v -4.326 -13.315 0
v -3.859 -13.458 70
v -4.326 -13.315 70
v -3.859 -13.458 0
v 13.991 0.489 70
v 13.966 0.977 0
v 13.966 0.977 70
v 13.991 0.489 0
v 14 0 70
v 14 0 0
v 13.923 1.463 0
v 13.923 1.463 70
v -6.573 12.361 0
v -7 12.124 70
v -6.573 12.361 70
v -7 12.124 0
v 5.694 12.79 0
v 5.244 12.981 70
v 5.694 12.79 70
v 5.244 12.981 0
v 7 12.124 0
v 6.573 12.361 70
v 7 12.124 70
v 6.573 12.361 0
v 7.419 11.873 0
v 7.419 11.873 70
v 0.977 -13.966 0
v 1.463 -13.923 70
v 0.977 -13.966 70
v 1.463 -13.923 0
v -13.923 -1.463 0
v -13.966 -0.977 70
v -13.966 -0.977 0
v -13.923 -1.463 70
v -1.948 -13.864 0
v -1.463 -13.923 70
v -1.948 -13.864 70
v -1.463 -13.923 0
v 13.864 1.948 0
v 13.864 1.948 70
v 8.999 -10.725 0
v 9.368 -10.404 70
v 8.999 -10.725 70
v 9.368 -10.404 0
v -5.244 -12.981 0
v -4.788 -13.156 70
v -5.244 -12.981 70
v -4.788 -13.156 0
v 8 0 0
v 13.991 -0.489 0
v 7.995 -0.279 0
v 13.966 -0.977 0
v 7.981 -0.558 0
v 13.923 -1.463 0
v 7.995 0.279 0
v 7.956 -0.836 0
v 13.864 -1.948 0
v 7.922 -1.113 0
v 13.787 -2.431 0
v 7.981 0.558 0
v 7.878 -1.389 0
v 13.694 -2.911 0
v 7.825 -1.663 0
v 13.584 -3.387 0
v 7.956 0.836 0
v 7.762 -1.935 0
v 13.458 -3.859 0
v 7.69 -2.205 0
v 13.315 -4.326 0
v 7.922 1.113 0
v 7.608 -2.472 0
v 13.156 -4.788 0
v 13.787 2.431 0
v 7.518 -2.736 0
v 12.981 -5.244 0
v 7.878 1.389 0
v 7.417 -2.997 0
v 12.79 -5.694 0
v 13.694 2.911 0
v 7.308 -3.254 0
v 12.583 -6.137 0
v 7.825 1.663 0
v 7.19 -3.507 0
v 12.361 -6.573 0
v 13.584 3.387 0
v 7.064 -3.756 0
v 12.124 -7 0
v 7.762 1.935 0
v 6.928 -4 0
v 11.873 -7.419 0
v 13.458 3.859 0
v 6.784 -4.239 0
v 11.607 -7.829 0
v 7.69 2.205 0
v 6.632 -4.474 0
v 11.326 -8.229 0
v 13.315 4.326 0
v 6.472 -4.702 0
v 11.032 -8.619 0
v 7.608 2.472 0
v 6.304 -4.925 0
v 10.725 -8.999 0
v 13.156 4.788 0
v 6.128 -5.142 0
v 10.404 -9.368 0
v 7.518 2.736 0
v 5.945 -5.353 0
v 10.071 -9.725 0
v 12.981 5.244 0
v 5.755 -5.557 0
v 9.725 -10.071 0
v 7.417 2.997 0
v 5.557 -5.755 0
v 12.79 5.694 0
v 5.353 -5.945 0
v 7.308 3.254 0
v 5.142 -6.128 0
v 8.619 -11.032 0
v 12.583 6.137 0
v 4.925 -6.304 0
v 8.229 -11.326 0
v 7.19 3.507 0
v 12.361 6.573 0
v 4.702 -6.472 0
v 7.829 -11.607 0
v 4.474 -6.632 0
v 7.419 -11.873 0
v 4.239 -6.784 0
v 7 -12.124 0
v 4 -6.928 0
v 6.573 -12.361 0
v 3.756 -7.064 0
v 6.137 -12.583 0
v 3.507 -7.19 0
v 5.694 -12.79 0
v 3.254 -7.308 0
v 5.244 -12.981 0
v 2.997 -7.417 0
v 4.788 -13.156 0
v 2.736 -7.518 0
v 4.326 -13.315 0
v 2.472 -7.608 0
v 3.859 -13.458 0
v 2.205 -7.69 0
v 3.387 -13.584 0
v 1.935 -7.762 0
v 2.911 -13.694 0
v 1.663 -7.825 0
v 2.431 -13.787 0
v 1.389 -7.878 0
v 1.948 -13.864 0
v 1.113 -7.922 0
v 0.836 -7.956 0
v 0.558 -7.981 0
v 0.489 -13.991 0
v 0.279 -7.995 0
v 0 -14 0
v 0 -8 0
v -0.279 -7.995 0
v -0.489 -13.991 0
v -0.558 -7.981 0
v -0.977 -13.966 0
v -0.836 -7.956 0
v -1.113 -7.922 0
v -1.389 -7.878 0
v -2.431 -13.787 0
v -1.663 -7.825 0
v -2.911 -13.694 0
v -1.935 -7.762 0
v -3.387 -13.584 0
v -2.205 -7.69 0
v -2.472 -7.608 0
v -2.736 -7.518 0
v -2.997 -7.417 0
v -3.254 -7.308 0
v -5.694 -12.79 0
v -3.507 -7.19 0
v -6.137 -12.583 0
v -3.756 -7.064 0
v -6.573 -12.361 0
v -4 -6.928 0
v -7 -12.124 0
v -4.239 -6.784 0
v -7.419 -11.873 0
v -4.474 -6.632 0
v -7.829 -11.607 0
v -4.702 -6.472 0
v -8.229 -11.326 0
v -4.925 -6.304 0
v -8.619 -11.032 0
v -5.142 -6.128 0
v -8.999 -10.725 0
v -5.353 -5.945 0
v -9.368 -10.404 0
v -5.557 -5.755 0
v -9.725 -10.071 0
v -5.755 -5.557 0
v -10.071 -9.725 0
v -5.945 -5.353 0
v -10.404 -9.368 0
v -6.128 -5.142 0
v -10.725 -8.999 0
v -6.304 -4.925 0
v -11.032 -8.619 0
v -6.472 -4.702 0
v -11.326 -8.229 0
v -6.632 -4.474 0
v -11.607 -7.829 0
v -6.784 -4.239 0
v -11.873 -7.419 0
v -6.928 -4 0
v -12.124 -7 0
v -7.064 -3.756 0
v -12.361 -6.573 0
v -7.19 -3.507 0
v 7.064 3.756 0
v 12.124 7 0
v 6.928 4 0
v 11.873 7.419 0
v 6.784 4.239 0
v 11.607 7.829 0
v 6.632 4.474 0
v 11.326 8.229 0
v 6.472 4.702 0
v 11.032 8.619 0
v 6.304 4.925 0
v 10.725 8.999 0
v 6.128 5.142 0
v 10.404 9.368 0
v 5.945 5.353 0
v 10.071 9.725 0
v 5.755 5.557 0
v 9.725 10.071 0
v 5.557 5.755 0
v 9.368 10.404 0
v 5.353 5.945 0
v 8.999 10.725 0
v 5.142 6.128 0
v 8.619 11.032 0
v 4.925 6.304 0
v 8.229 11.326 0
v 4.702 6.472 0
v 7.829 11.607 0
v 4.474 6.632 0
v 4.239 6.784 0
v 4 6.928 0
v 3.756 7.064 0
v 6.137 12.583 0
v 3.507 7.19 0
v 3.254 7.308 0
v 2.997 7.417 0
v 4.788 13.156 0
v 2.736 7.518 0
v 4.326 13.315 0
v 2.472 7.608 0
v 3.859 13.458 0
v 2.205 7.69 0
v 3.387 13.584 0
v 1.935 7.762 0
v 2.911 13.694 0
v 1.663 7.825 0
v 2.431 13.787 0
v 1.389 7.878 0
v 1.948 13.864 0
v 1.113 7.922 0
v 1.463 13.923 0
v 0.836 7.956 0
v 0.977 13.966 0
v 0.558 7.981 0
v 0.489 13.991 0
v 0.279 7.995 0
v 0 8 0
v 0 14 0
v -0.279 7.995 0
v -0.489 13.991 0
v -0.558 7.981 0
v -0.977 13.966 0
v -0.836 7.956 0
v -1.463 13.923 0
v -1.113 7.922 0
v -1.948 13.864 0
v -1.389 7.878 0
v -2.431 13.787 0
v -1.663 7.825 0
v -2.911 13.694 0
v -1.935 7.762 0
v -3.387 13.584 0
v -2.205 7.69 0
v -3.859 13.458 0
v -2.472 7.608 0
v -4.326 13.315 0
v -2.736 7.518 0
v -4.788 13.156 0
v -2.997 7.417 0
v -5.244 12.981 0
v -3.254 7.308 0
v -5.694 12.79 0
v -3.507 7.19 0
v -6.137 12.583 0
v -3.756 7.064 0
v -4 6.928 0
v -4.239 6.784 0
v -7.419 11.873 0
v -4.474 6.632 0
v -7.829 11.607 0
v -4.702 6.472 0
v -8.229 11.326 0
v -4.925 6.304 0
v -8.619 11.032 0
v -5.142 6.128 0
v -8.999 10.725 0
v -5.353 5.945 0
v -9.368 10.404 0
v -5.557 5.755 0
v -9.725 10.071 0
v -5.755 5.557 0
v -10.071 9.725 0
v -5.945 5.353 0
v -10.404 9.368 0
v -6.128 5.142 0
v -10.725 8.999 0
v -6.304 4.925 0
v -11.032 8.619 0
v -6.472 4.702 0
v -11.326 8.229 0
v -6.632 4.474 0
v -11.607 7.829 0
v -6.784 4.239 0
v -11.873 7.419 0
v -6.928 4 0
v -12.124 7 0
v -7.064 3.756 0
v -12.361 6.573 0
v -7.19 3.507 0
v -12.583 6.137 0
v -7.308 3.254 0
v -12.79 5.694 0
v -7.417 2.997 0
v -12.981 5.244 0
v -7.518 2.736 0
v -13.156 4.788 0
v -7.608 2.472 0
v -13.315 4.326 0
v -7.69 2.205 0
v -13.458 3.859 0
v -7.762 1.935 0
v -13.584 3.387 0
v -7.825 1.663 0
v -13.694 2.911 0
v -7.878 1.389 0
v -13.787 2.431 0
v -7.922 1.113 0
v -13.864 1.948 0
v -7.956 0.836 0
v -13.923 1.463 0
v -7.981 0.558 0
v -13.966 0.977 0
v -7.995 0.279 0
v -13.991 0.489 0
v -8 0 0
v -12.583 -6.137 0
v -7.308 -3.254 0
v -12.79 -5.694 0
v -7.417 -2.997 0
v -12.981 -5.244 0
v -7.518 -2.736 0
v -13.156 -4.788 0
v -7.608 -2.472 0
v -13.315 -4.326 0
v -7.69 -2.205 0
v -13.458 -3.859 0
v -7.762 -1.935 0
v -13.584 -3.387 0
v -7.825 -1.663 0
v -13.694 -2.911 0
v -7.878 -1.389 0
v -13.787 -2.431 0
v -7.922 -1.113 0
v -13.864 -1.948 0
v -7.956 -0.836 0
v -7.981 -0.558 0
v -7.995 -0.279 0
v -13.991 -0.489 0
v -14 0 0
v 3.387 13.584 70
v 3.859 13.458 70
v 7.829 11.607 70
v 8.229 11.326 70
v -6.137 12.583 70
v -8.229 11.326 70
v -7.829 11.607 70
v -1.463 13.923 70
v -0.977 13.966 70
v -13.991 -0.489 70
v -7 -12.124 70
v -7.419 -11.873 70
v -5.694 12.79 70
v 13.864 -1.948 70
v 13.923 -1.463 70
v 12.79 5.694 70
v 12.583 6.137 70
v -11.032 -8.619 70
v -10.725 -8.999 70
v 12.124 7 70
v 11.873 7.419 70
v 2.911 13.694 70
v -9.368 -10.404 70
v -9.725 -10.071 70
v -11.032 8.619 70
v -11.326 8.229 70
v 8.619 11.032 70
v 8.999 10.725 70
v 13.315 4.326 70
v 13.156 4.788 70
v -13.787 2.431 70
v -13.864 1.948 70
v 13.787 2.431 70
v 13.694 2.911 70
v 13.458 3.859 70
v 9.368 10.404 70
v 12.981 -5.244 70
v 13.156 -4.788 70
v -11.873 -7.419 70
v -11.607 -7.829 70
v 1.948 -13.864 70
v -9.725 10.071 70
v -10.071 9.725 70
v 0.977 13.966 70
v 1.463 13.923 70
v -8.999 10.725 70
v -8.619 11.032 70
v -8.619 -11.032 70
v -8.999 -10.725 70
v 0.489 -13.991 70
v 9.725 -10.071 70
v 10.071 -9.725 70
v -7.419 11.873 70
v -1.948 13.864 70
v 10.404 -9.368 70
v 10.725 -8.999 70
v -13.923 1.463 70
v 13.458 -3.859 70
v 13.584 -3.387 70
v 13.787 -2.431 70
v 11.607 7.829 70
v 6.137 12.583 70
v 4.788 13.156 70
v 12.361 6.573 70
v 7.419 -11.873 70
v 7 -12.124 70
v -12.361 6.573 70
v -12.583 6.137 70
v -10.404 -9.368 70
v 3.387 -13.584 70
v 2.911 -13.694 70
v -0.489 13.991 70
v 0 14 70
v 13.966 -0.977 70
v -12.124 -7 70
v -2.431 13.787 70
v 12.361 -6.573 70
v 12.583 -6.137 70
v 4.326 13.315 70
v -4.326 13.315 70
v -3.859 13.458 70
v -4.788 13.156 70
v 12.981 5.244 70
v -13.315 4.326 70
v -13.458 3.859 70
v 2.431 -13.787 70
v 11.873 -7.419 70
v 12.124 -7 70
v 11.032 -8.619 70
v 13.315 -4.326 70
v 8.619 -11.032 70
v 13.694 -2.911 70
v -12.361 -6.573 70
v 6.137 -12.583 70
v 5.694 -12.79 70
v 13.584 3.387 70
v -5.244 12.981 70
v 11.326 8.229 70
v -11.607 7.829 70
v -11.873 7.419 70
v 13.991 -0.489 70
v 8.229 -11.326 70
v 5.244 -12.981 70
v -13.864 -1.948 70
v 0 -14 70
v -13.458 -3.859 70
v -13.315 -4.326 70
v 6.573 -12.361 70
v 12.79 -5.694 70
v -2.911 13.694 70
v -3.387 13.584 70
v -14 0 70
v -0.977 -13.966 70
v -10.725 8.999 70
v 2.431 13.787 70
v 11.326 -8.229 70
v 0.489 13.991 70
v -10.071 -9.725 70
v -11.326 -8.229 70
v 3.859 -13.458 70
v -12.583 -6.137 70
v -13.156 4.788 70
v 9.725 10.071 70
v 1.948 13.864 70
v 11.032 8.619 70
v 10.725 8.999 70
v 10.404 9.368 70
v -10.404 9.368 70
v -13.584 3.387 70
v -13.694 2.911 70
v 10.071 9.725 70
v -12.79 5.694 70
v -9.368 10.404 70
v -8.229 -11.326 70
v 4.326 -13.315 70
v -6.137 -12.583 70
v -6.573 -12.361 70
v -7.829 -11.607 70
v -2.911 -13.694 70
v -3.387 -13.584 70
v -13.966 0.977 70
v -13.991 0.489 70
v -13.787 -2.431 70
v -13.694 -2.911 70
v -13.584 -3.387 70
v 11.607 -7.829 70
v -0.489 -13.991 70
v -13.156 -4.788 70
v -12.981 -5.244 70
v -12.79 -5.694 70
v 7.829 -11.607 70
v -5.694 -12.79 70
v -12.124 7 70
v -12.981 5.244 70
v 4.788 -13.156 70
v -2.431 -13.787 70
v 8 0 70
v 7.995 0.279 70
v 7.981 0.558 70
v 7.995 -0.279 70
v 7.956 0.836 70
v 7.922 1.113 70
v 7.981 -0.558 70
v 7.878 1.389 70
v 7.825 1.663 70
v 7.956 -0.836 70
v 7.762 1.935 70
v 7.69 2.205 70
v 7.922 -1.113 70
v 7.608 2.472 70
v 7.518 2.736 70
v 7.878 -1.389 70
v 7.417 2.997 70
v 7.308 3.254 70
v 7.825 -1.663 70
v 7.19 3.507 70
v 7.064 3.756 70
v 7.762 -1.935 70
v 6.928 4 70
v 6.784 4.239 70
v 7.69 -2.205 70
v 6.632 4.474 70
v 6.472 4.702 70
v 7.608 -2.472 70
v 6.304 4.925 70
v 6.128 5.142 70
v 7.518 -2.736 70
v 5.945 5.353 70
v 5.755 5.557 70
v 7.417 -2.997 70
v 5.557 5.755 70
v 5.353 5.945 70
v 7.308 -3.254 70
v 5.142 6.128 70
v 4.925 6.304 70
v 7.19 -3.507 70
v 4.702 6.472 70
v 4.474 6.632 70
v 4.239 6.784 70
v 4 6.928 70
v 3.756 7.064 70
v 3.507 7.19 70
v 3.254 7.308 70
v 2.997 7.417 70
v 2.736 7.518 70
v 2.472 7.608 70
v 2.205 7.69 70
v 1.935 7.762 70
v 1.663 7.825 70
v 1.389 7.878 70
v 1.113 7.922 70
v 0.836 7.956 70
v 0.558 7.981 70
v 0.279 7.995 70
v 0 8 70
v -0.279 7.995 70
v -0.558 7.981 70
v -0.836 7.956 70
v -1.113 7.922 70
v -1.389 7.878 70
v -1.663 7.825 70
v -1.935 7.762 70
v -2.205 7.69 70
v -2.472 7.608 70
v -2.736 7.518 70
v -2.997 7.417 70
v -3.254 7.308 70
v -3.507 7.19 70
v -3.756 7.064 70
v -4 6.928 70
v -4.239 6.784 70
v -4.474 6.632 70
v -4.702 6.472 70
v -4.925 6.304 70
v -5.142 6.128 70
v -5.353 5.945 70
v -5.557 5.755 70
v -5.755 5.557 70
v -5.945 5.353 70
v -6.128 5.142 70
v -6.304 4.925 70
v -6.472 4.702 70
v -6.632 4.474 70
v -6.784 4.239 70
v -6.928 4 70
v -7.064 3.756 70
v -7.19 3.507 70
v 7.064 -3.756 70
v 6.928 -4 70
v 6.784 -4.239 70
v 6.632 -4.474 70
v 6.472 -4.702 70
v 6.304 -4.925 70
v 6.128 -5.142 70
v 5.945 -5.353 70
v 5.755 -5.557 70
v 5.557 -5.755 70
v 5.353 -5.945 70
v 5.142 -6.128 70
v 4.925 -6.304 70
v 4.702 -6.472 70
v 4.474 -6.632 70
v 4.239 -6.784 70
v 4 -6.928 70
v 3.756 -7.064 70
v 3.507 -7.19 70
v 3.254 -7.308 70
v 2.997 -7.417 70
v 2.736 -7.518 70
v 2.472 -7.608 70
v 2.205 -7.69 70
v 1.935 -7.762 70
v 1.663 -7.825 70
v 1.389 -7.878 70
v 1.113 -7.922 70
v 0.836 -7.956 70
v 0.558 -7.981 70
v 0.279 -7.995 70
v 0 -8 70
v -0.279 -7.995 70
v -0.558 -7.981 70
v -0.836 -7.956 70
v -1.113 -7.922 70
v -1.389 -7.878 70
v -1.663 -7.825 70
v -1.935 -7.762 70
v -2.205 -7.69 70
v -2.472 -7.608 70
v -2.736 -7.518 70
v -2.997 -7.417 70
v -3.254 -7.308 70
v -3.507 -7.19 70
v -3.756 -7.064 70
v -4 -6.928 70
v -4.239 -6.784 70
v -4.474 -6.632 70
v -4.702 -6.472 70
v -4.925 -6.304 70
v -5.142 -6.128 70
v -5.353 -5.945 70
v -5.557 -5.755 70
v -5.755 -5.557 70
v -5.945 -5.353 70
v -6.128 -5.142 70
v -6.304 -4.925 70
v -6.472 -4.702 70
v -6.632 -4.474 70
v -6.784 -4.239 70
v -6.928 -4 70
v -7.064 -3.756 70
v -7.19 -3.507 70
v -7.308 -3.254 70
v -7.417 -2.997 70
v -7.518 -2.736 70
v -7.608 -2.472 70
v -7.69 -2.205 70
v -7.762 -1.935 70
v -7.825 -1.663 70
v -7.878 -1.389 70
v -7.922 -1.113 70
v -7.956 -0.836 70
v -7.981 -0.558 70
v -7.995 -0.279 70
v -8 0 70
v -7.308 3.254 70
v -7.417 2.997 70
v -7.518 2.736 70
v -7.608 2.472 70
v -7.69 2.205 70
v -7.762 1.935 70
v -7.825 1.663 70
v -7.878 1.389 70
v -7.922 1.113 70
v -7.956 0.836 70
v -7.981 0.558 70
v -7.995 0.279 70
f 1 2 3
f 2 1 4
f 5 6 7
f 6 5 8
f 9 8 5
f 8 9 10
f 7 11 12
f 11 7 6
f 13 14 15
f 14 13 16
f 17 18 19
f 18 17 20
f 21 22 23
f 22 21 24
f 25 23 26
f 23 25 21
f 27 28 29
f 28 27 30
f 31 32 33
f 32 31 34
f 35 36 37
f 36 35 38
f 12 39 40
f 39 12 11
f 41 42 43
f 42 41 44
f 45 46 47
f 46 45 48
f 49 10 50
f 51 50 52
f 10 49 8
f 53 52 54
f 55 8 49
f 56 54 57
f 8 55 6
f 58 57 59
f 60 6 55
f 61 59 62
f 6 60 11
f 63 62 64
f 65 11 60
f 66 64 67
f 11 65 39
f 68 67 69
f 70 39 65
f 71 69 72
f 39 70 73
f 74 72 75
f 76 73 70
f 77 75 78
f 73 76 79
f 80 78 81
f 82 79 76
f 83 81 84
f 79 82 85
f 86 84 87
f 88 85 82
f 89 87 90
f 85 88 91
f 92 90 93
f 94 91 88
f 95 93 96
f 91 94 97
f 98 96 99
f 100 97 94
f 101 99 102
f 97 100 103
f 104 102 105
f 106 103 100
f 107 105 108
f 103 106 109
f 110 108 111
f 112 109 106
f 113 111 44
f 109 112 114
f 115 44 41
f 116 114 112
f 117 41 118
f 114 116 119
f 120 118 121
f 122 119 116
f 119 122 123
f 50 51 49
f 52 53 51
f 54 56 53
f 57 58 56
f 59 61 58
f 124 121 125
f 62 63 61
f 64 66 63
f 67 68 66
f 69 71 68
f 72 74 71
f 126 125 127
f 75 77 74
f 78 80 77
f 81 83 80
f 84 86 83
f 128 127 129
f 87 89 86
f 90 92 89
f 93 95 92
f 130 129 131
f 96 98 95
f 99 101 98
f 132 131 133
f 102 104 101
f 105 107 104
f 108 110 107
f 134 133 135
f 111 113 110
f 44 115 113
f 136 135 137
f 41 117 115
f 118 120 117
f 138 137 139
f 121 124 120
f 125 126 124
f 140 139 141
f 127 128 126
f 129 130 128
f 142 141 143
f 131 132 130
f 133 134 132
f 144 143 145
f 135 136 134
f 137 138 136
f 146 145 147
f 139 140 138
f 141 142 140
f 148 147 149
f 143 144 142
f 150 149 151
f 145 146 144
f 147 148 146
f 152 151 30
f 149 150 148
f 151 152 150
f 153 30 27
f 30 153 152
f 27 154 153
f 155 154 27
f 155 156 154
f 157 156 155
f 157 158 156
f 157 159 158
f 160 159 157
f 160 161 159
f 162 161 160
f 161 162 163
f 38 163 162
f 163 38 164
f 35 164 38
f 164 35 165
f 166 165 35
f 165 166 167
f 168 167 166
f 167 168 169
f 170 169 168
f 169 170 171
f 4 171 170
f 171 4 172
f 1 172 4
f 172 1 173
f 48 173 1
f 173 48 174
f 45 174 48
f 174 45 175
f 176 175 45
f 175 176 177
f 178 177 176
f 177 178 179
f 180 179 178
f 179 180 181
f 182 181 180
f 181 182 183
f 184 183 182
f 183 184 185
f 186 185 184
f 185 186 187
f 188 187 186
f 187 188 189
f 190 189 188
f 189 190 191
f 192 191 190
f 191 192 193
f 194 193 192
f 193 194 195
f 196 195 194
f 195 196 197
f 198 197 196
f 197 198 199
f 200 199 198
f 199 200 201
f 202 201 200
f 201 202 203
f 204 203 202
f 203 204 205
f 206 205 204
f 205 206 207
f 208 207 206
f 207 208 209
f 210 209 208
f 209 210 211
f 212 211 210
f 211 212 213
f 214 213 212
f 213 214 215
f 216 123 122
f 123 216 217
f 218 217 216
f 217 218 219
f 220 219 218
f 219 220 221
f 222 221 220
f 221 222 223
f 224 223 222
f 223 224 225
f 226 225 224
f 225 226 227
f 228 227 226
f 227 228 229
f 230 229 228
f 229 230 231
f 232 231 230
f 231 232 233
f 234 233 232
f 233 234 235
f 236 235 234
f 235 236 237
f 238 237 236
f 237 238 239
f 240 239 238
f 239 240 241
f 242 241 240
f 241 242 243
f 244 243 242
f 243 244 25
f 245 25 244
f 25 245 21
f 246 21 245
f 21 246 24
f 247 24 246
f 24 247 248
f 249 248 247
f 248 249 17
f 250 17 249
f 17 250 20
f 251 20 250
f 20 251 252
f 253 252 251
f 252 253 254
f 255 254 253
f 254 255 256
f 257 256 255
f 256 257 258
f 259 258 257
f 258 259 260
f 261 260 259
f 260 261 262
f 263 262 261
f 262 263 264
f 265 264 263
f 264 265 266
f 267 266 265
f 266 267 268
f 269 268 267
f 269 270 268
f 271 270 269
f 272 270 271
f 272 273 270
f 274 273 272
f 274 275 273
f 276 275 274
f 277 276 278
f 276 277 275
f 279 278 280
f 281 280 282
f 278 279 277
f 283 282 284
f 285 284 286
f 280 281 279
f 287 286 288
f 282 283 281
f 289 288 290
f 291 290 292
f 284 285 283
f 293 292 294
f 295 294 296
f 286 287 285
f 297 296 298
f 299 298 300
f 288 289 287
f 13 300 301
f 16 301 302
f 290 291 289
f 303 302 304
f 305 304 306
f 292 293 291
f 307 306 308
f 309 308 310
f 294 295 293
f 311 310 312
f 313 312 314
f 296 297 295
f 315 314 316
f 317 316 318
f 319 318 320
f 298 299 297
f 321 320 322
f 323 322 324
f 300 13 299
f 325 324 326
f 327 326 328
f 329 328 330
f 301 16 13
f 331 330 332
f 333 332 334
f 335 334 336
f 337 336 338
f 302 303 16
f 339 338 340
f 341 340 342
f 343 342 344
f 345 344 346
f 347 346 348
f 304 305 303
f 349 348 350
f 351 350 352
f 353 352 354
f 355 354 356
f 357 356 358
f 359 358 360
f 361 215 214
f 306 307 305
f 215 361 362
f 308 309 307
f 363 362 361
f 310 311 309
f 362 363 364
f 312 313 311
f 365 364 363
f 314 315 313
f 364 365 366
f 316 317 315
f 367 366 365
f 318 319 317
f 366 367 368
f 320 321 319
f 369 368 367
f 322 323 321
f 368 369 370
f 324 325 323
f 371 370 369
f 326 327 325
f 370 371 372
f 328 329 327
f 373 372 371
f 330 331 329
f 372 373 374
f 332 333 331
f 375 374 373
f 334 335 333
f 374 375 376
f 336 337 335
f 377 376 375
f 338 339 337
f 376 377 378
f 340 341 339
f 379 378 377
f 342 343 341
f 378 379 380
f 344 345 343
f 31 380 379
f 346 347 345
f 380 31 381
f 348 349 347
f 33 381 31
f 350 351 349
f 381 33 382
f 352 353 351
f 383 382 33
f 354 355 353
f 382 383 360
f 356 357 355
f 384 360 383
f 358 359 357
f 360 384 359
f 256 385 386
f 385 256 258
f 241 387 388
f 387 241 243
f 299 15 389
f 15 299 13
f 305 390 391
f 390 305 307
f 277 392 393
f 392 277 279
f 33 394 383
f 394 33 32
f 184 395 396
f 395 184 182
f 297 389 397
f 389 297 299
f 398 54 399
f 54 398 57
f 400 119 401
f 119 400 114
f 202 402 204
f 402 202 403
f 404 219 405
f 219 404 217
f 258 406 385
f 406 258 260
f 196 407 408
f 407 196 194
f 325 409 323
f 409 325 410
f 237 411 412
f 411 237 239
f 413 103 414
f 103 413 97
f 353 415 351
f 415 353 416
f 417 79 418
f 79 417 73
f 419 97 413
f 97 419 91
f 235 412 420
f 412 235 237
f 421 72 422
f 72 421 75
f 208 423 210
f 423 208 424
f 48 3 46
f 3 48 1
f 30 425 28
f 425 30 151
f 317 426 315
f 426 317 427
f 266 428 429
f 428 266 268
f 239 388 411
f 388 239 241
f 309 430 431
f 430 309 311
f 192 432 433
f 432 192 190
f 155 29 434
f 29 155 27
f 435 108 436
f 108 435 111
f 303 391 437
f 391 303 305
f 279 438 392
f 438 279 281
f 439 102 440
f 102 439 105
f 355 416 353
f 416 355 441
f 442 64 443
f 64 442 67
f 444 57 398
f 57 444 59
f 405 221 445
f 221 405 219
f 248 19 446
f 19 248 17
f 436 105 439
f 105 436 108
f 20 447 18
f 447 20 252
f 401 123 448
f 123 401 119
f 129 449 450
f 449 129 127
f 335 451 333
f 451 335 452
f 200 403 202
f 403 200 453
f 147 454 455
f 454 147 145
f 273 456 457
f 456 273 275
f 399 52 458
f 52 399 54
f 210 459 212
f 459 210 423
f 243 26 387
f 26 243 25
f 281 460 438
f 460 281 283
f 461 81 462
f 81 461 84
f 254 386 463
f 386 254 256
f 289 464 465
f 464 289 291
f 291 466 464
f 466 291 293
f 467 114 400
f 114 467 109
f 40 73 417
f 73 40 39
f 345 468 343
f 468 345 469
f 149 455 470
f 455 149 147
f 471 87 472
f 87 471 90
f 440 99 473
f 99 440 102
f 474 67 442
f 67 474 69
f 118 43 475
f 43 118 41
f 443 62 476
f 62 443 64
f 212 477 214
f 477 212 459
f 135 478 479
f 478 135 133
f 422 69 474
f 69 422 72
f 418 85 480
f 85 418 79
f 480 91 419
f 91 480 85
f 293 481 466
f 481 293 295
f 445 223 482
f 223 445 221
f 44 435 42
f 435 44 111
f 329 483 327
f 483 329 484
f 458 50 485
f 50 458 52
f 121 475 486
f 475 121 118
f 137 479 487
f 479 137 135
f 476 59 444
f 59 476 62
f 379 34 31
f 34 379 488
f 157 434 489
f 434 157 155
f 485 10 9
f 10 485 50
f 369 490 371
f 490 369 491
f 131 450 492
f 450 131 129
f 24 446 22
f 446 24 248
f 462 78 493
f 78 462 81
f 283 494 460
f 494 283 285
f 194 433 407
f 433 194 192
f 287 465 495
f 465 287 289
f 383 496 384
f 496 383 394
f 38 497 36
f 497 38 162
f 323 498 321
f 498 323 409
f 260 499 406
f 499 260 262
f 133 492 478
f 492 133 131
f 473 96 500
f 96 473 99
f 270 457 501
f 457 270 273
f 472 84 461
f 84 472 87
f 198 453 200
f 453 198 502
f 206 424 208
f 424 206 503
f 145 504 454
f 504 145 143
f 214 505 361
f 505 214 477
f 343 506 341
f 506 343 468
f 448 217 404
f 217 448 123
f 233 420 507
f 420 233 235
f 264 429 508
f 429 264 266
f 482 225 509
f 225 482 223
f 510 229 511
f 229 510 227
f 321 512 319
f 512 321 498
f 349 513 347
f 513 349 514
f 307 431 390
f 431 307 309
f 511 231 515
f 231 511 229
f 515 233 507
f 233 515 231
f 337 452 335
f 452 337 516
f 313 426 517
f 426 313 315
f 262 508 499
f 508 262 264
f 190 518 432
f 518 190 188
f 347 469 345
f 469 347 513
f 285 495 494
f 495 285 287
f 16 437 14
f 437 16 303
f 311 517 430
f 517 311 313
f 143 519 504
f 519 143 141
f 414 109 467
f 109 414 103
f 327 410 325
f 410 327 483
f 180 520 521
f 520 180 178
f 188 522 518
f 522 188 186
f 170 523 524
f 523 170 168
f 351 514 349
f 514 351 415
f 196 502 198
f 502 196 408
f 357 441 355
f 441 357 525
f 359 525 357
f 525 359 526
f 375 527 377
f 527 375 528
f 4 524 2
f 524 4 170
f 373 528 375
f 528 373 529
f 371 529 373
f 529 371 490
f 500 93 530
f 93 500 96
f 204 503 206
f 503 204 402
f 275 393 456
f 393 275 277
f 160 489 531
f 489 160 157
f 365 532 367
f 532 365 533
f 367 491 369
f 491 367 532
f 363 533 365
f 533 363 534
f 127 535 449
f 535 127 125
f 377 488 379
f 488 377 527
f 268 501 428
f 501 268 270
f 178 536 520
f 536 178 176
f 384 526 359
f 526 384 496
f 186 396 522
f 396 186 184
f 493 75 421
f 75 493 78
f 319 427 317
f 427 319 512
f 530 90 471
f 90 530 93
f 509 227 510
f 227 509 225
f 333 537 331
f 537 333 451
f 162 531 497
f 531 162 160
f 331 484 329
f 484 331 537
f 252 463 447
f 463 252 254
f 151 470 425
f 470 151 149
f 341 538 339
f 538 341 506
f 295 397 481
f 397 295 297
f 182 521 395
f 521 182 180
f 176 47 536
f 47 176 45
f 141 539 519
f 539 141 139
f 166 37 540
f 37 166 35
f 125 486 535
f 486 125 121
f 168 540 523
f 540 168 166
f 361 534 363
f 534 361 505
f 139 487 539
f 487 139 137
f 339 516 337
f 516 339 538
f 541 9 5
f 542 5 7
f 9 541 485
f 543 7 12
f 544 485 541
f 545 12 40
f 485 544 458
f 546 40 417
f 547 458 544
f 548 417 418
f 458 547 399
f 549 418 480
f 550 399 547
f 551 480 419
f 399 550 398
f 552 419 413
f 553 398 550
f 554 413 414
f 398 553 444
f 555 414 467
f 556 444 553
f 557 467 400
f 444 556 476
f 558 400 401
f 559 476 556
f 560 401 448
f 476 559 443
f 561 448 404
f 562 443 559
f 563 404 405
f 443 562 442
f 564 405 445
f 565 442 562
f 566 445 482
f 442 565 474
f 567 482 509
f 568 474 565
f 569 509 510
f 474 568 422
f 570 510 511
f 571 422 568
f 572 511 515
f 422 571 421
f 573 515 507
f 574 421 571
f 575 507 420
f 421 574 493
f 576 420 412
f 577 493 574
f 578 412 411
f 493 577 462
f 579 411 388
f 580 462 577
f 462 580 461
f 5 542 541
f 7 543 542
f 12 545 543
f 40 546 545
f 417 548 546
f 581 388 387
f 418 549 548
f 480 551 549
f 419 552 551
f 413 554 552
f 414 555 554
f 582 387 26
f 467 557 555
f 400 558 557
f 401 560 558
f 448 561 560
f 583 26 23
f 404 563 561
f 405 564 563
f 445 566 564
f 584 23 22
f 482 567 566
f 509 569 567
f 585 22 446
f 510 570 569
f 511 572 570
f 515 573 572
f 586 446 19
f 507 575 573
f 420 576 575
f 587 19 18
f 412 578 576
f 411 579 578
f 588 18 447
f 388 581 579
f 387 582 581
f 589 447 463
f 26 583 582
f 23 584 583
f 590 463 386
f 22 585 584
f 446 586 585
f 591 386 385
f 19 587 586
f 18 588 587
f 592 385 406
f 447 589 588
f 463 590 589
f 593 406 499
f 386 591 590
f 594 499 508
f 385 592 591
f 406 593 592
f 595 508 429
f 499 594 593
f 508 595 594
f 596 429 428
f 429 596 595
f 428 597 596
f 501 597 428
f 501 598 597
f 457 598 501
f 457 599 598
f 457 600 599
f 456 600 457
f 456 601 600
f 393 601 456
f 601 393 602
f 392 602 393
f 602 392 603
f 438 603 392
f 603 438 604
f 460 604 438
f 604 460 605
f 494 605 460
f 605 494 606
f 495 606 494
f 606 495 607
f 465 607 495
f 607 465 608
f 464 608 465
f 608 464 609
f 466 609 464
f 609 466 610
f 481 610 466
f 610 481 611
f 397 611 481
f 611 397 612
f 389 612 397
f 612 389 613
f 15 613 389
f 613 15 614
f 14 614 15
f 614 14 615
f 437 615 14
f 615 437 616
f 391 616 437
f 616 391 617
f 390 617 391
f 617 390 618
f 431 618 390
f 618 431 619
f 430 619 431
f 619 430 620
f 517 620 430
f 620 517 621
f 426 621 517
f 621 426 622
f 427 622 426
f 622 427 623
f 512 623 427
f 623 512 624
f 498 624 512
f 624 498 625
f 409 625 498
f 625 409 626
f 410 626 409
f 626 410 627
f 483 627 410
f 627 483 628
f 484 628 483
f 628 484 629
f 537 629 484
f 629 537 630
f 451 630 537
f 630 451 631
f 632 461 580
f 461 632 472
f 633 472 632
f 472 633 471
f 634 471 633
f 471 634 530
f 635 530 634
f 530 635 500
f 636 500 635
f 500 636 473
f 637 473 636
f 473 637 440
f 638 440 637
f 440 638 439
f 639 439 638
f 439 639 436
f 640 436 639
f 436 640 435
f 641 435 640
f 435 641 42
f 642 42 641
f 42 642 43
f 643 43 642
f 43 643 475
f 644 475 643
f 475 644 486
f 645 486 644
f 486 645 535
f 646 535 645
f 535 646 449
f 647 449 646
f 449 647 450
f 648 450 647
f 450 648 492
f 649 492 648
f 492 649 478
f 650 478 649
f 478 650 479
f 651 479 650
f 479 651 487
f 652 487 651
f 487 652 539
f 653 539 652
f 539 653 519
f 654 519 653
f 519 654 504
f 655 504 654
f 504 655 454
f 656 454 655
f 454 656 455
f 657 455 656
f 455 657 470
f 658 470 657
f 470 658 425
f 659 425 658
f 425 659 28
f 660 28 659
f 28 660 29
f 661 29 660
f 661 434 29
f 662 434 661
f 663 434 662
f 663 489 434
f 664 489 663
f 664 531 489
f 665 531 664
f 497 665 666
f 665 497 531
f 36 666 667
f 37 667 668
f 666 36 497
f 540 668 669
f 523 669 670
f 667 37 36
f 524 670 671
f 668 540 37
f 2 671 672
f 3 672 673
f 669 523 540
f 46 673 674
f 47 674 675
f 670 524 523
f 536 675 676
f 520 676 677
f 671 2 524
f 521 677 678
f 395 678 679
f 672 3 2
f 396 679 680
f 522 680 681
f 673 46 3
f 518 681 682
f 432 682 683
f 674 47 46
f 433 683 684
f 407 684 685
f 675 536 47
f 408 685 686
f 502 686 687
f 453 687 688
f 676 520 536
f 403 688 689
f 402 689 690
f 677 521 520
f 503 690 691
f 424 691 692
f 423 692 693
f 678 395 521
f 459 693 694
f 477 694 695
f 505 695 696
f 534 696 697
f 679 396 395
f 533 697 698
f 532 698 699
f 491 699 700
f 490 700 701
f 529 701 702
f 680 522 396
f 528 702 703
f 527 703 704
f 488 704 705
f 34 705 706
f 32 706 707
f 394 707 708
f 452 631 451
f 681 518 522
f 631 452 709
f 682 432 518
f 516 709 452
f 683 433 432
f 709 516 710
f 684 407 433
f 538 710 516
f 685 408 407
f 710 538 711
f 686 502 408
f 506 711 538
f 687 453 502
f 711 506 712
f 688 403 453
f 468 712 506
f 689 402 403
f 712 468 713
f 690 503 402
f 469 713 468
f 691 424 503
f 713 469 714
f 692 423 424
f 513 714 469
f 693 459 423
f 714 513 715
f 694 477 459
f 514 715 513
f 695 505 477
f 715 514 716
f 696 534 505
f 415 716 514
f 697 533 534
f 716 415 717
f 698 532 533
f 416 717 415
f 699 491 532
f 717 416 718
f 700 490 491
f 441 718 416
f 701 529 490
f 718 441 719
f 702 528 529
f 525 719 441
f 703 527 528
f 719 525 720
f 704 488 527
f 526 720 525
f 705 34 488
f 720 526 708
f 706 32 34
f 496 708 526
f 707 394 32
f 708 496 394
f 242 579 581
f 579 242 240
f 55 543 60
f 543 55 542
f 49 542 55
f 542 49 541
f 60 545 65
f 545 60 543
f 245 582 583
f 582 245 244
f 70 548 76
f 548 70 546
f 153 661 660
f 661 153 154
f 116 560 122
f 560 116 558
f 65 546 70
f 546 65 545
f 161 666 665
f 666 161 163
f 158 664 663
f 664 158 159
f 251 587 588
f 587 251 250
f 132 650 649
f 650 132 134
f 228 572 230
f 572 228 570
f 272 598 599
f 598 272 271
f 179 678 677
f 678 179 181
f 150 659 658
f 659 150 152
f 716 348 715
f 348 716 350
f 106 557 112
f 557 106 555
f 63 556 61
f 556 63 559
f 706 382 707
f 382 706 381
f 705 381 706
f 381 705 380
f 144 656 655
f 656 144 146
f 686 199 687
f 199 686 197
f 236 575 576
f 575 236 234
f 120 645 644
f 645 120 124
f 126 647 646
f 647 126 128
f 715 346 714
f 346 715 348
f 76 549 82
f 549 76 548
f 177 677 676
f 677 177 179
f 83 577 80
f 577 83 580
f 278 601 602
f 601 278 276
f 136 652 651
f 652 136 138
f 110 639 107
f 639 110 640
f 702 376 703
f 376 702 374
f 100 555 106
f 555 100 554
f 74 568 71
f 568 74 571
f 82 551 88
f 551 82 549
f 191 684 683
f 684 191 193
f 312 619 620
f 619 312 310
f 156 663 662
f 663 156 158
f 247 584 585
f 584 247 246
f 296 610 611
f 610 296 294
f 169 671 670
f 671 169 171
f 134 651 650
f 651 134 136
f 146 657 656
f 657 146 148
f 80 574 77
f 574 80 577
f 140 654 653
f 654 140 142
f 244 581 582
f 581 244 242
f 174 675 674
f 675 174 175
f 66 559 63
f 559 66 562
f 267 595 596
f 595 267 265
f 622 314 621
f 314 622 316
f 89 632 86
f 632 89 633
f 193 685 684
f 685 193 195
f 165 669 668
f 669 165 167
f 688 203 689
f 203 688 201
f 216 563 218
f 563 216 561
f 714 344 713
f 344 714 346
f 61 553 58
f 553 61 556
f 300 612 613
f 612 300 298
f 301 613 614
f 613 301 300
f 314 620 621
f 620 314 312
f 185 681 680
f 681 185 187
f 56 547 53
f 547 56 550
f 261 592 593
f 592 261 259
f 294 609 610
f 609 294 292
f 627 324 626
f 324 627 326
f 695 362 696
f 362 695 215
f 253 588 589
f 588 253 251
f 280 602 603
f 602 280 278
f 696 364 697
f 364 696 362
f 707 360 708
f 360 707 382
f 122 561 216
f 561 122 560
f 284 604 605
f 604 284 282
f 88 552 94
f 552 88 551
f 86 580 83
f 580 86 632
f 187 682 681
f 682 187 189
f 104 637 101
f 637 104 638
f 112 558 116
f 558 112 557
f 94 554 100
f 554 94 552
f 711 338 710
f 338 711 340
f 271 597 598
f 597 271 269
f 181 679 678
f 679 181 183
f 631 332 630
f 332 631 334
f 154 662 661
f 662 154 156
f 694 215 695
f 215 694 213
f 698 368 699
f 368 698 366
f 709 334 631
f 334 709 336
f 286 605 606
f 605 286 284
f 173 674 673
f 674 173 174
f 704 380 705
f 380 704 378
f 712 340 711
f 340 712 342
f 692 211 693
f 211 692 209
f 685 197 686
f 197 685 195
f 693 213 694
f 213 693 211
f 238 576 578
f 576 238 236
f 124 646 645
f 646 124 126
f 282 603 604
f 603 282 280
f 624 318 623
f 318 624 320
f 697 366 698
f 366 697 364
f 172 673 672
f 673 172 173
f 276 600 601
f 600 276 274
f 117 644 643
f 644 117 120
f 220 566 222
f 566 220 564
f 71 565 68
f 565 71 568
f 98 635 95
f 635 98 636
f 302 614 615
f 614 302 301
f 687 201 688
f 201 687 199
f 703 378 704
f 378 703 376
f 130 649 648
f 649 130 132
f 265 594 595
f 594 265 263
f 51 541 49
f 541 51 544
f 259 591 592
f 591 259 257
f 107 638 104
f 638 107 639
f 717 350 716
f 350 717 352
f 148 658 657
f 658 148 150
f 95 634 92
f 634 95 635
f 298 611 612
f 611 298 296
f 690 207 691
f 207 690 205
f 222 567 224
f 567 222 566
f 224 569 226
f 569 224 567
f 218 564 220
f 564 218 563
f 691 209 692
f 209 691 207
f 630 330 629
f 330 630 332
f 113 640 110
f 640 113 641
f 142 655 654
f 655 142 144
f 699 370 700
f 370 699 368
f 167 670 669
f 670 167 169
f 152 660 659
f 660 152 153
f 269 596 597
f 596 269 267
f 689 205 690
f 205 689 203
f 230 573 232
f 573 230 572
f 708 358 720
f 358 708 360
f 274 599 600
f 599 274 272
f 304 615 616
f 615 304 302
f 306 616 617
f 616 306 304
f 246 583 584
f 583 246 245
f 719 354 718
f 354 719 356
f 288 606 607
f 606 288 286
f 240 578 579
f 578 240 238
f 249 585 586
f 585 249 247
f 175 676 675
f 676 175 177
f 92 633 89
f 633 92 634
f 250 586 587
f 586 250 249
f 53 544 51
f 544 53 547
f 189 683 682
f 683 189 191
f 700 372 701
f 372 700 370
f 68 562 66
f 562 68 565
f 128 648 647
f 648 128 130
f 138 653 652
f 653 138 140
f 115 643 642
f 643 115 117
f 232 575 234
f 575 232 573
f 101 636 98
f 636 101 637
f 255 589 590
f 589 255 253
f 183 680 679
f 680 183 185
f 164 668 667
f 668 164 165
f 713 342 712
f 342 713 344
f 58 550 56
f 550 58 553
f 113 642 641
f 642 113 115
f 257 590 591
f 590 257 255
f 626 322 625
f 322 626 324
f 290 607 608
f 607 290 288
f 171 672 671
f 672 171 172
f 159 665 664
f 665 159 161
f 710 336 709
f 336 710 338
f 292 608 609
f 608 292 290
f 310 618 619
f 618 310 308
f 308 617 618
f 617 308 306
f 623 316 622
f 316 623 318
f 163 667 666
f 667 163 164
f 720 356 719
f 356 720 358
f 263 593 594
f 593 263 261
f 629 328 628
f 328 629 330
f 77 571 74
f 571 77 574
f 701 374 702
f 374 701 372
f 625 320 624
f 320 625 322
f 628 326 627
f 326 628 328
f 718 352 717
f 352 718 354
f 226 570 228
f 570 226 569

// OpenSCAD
$fn = 180;

bore_d = 16.0;
outer_d = 28.0;
length = 70.0;

difference() {
  cylinder(d = outer_d, h = length, center = false);
  translate([0, 0, -0.1])
    cylinder(d = bore_d, h = length + 0.2, center = false);
}
